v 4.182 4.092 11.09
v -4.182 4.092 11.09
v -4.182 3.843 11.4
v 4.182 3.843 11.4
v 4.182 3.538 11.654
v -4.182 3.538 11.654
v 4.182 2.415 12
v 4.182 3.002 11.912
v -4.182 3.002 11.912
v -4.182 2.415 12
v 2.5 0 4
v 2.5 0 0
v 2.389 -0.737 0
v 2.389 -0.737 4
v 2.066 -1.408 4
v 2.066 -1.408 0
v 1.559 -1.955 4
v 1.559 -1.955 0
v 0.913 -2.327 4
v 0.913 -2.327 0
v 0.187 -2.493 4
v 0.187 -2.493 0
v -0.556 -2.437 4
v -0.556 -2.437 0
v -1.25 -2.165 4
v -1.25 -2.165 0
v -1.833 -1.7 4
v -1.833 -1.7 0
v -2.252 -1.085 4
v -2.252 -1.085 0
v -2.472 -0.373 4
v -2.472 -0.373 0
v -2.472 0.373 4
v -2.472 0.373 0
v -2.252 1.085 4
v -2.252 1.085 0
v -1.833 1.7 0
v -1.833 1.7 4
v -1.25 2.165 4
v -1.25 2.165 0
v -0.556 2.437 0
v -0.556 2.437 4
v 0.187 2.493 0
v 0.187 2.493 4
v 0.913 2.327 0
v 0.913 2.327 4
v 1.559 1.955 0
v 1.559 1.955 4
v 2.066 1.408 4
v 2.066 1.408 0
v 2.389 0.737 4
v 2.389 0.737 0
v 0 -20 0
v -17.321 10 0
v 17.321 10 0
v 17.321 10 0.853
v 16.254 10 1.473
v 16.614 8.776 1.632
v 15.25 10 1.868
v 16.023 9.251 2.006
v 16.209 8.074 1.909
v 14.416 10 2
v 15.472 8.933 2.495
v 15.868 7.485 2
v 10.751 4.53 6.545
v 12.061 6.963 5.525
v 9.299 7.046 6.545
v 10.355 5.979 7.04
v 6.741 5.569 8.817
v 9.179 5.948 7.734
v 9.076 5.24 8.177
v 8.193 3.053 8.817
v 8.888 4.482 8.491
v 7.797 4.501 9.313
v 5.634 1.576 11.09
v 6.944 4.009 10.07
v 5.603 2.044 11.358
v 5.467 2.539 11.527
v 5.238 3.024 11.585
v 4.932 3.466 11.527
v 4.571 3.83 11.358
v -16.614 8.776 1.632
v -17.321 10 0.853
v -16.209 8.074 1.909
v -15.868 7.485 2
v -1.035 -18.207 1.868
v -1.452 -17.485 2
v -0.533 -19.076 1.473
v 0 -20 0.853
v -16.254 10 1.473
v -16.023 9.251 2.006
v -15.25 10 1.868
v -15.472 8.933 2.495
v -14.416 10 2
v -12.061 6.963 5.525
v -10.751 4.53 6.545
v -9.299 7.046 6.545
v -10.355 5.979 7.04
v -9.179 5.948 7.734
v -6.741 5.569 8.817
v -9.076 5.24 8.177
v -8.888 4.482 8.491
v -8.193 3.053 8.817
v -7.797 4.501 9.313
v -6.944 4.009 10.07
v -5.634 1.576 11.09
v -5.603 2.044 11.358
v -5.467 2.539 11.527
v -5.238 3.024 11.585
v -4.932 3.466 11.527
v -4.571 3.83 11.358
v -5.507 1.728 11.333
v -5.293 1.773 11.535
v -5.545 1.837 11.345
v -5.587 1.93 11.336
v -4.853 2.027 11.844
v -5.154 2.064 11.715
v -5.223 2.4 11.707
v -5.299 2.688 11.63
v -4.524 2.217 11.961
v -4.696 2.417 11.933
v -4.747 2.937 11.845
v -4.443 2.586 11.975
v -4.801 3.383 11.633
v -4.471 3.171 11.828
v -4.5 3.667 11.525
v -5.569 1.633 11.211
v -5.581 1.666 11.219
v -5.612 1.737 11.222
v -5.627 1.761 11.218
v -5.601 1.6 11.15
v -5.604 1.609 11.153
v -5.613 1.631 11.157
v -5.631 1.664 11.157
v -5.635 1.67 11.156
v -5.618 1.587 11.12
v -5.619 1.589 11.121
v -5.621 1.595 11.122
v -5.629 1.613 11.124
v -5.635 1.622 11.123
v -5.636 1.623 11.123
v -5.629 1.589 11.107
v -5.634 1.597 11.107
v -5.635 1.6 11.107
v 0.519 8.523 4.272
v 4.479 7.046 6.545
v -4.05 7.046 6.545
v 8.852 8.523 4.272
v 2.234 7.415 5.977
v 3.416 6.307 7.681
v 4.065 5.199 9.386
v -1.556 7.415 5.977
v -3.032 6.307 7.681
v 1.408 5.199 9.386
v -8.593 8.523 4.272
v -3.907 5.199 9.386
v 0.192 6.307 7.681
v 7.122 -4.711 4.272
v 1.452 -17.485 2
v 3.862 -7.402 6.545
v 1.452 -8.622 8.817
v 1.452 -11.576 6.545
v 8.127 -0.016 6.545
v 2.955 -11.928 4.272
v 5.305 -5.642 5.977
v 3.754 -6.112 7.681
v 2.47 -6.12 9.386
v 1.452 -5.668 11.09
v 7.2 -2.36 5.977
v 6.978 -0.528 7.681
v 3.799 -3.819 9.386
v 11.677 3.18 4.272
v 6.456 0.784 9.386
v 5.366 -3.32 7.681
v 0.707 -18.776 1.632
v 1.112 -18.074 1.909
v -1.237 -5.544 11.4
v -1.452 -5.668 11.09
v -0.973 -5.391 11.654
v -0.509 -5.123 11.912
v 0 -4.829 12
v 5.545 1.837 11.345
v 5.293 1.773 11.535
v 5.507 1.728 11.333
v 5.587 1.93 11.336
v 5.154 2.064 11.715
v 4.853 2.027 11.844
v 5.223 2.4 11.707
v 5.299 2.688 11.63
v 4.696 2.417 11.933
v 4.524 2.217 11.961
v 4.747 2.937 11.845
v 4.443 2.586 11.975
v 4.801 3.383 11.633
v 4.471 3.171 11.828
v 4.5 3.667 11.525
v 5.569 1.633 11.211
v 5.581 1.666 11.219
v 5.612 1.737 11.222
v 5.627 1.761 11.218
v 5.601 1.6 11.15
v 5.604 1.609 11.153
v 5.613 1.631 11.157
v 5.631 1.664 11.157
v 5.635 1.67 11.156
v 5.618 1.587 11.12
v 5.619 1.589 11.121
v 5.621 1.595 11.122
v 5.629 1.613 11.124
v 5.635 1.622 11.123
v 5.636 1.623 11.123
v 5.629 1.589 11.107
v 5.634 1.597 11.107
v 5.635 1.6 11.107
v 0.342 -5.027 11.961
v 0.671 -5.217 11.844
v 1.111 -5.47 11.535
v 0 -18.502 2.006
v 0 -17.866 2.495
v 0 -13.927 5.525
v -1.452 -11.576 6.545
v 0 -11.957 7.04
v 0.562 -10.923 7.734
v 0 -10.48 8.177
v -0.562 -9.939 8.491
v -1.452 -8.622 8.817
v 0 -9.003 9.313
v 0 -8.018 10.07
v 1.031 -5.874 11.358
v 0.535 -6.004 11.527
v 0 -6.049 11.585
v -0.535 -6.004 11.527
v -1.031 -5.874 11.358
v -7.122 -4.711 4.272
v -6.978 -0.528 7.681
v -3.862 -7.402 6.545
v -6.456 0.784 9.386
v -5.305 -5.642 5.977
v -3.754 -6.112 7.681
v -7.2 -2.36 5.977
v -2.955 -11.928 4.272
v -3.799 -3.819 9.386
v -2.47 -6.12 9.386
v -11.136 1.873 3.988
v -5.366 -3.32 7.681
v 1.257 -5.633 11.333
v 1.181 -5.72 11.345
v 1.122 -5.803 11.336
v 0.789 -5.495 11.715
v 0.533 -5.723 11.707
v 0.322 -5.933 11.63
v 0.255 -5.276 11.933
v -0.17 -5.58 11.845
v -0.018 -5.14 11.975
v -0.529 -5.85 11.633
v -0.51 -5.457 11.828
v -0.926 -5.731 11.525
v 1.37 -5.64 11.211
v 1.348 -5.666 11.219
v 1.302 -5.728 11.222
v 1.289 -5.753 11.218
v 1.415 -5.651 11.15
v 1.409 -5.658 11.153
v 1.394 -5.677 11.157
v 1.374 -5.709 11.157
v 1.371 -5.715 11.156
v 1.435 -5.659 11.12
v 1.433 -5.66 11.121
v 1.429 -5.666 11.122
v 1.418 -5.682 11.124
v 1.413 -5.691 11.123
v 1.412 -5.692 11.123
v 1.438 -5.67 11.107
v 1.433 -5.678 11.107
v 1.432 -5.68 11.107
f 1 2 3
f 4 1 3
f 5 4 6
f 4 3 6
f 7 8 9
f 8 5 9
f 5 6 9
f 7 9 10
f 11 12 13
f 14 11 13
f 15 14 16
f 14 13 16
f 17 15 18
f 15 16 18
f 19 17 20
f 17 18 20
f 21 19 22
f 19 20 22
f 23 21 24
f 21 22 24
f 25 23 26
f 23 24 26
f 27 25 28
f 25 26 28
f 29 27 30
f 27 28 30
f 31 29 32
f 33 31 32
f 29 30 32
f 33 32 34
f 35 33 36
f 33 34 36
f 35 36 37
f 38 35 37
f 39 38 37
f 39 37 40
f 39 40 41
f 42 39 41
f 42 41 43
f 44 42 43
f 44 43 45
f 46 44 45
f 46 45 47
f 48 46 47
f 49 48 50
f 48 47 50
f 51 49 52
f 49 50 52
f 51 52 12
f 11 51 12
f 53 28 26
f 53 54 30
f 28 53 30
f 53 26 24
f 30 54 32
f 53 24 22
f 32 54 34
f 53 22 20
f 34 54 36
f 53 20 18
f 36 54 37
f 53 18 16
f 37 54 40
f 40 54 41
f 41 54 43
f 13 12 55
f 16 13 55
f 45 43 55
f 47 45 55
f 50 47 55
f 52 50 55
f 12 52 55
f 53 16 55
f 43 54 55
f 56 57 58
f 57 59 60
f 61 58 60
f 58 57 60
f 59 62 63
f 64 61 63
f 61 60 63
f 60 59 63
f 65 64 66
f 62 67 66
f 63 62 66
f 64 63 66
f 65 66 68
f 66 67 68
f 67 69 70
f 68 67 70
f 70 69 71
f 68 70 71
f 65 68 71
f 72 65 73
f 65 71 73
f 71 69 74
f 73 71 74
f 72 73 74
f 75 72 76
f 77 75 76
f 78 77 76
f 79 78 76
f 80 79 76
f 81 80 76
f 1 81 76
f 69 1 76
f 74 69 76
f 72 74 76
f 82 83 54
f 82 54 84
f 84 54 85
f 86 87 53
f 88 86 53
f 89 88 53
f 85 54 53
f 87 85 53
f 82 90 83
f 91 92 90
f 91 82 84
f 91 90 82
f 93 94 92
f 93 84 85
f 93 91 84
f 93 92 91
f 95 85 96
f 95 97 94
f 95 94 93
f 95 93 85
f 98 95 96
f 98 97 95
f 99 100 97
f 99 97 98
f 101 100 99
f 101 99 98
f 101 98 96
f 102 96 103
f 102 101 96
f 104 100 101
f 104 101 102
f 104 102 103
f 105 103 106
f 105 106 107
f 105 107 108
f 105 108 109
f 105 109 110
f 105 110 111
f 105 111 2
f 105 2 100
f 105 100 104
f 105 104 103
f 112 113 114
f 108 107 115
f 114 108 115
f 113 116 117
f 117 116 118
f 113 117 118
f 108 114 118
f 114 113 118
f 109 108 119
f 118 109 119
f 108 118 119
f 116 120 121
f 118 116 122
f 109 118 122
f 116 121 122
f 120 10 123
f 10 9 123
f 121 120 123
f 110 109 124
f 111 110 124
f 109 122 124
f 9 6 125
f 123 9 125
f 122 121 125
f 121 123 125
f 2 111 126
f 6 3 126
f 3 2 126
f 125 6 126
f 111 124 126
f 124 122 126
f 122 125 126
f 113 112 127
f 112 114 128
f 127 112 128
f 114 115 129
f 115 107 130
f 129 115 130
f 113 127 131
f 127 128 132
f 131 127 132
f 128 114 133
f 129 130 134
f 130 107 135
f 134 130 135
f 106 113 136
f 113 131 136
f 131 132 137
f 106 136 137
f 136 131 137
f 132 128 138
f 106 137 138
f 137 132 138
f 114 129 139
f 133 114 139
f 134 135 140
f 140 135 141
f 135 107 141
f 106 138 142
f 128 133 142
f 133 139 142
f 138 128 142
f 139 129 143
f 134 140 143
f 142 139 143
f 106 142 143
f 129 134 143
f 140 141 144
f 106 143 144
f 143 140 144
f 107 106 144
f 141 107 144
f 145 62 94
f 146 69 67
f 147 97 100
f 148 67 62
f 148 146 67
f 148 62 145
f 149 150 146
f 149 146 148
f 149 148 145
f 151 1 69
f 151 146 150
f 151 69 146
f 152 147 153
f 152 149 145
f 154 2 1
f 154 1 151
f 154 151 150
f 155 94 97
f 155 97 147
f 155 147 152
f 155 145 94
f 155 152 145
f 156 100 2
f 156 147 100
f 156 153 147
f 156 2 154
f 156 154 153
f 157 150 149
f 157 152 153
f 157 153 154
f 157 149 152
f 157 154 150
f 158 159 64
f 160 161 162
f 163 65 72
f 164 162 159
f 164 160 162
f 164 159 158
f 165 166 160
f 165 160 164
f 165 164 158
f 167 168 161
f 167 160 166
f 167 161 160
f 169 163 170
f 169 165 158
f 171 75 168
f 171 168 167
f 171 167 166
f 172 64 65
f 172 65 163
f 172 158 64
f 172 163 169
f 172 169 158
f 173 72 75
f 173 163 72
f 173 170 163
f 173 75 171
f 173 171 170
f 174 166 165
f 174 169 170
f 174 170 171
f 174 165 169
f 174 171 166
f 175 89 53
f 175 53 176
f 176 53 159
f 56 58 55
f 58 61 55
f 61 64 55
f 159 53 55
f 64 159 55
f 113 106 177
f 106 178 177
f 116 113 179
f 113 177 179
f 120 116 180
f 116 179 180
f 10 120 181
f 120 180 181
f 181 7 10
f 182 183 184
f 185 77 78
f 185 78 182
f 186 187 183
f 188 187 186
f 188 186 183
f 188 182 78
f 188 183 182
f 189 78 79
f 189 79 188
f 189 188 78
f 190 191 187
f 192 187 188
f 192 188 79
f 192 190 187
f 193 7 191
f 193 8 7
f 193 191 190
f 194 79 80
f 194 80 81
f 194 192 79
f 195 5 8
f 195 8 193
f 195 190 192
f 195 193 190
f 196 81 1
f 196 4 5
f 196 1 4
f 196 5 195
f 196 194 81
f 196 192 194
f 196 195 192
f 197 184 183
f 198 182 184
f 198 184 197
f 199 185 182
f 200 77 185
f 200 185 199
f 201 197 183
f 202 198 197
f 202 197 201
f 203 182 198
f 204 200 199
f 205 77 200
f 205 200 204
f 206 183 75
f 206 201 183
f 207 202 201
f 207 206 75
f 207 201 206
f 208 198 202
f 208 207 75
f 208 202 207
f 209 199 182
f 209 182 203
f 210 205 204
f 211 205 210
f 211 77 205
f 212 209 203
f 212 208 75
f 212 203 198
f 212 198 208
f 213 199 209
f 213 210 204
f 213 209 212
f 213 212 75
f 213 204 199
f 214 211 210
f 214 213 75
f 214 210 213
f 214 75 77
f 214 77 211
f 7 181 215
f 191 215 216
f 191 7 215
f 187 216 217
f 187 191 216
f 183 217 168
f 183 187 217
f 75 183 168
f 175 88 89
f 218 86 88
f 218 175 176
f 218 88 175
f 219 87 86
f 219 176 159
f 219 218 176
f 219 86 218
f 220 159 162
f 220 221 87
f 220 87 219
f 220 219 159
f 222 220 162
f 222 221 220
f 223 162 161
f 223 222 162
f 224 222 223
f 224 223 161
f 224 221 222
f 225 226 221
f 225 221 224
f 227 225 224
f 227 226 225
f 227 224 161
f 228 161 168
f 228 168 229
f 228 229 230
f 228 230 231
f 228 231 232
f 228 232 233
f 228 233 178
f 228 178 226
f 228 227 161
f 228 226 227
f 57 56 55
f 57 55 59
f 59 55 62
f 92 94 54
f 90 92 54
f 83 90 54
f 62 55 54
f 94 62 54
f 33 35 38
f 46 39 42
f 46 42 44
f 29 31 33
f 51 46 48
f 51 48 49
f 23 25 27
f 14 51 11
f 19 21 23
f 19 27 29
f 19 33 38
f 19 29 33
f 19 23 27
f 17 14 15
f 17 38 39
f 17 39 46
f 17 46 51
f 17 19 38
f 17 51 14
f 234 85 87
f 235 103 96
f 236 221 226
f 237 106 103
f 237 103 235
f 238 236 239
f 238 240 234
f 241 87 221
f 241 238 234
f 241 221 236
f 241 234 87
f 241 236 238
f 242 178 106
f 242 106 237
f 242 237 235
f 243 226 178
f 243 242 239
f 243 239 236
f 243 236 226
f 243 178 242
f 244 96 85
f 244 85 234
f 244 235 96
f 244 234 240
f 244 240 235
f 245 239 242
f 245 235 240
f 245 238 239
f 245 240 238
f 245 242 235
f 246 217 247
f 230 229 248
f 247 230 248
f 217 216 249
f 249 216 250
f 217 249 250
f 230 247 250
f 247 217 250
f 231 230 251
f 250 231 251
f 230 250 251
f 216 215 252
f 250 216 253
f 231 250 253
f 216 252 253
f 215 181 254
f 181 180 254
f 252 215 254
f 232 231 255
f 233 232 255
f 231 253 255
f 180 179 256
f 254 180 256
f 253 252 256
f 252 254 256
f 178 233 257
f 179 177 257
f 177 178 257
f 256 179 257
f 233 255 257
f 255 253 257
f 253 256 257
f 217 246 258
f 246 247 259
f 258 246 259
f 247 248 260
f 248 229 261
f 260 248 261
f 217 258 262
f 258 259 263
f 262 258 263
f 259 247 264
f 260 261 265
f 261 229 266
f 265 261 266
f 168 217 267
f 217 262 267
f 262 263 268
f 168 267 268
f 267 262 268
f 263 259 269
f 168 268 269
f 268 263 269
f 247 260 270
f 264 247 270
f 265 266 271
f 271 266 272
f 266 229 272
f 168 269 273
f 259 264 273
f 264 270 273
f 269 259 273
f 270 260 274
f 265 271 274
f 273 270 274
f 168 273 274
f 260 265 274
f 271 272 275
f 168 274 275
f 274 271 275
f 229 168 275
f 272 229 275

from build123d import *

# Parameters (mm, degrees)
PAD002_DEPTH    = 2
SKETCH016_R     = 2.5
POCKET001_DEPTH = 4
FILLET001_R     = 2


with BuildPart() as part:
    # Sketch013 → Pad002 (new body)
    with BuildSketch(Plane.XY):
        Polygon((17.320508, 10), (-17.320508, 10), (0, -20), align=None)
    extrude(amount=PAD002_DEPTH)

    # Sketch015 (on Face5 of Pad002) → AdditiveLoft004 section 0
    with BuildSketch(Plane.XY.offset(2)):
        Polygon((17.320508, 10), (-17.320508, 10), (0, -20), align=None)
    # Sketch014 (on Face5 of Pad002) → AdditiveLoft004 section 1
    with BuildSketch(Plane.XY.offset(12)):
        Polygon((0, -7), (6.062178, 3.5), (-6.062178, 3.5), align=None)
    loft()

    # Sketch016 (on Face4 of AdditiveLoft004) → Pocket001 (cut)
    with BuildSketch(Plane(origin=(0, 0, 0), x_dir=(1, 0, 0), z_dir=(0, 0, -1))):
        Circle(SKETCH016_R)
    extrude(amount=-POCKET001_DEPTH, mode=Mode.SUBTRACT)

    # Fillet001
    fillet001_edges = [part.edges().sort_by_distance(p)[0] for p in [
        (11.691343, 6.75, 7),
        (0, 3.5, 12),
        (-3.031089, -1.75, 12),
        (-11.691343, 6.75, 7),
        (3.031089, -1.75, 12),
        (0, -13.5, 7),
    ]]
    fillet(fillet001_edges, radius=FILLET001_R)


solid = part.part
